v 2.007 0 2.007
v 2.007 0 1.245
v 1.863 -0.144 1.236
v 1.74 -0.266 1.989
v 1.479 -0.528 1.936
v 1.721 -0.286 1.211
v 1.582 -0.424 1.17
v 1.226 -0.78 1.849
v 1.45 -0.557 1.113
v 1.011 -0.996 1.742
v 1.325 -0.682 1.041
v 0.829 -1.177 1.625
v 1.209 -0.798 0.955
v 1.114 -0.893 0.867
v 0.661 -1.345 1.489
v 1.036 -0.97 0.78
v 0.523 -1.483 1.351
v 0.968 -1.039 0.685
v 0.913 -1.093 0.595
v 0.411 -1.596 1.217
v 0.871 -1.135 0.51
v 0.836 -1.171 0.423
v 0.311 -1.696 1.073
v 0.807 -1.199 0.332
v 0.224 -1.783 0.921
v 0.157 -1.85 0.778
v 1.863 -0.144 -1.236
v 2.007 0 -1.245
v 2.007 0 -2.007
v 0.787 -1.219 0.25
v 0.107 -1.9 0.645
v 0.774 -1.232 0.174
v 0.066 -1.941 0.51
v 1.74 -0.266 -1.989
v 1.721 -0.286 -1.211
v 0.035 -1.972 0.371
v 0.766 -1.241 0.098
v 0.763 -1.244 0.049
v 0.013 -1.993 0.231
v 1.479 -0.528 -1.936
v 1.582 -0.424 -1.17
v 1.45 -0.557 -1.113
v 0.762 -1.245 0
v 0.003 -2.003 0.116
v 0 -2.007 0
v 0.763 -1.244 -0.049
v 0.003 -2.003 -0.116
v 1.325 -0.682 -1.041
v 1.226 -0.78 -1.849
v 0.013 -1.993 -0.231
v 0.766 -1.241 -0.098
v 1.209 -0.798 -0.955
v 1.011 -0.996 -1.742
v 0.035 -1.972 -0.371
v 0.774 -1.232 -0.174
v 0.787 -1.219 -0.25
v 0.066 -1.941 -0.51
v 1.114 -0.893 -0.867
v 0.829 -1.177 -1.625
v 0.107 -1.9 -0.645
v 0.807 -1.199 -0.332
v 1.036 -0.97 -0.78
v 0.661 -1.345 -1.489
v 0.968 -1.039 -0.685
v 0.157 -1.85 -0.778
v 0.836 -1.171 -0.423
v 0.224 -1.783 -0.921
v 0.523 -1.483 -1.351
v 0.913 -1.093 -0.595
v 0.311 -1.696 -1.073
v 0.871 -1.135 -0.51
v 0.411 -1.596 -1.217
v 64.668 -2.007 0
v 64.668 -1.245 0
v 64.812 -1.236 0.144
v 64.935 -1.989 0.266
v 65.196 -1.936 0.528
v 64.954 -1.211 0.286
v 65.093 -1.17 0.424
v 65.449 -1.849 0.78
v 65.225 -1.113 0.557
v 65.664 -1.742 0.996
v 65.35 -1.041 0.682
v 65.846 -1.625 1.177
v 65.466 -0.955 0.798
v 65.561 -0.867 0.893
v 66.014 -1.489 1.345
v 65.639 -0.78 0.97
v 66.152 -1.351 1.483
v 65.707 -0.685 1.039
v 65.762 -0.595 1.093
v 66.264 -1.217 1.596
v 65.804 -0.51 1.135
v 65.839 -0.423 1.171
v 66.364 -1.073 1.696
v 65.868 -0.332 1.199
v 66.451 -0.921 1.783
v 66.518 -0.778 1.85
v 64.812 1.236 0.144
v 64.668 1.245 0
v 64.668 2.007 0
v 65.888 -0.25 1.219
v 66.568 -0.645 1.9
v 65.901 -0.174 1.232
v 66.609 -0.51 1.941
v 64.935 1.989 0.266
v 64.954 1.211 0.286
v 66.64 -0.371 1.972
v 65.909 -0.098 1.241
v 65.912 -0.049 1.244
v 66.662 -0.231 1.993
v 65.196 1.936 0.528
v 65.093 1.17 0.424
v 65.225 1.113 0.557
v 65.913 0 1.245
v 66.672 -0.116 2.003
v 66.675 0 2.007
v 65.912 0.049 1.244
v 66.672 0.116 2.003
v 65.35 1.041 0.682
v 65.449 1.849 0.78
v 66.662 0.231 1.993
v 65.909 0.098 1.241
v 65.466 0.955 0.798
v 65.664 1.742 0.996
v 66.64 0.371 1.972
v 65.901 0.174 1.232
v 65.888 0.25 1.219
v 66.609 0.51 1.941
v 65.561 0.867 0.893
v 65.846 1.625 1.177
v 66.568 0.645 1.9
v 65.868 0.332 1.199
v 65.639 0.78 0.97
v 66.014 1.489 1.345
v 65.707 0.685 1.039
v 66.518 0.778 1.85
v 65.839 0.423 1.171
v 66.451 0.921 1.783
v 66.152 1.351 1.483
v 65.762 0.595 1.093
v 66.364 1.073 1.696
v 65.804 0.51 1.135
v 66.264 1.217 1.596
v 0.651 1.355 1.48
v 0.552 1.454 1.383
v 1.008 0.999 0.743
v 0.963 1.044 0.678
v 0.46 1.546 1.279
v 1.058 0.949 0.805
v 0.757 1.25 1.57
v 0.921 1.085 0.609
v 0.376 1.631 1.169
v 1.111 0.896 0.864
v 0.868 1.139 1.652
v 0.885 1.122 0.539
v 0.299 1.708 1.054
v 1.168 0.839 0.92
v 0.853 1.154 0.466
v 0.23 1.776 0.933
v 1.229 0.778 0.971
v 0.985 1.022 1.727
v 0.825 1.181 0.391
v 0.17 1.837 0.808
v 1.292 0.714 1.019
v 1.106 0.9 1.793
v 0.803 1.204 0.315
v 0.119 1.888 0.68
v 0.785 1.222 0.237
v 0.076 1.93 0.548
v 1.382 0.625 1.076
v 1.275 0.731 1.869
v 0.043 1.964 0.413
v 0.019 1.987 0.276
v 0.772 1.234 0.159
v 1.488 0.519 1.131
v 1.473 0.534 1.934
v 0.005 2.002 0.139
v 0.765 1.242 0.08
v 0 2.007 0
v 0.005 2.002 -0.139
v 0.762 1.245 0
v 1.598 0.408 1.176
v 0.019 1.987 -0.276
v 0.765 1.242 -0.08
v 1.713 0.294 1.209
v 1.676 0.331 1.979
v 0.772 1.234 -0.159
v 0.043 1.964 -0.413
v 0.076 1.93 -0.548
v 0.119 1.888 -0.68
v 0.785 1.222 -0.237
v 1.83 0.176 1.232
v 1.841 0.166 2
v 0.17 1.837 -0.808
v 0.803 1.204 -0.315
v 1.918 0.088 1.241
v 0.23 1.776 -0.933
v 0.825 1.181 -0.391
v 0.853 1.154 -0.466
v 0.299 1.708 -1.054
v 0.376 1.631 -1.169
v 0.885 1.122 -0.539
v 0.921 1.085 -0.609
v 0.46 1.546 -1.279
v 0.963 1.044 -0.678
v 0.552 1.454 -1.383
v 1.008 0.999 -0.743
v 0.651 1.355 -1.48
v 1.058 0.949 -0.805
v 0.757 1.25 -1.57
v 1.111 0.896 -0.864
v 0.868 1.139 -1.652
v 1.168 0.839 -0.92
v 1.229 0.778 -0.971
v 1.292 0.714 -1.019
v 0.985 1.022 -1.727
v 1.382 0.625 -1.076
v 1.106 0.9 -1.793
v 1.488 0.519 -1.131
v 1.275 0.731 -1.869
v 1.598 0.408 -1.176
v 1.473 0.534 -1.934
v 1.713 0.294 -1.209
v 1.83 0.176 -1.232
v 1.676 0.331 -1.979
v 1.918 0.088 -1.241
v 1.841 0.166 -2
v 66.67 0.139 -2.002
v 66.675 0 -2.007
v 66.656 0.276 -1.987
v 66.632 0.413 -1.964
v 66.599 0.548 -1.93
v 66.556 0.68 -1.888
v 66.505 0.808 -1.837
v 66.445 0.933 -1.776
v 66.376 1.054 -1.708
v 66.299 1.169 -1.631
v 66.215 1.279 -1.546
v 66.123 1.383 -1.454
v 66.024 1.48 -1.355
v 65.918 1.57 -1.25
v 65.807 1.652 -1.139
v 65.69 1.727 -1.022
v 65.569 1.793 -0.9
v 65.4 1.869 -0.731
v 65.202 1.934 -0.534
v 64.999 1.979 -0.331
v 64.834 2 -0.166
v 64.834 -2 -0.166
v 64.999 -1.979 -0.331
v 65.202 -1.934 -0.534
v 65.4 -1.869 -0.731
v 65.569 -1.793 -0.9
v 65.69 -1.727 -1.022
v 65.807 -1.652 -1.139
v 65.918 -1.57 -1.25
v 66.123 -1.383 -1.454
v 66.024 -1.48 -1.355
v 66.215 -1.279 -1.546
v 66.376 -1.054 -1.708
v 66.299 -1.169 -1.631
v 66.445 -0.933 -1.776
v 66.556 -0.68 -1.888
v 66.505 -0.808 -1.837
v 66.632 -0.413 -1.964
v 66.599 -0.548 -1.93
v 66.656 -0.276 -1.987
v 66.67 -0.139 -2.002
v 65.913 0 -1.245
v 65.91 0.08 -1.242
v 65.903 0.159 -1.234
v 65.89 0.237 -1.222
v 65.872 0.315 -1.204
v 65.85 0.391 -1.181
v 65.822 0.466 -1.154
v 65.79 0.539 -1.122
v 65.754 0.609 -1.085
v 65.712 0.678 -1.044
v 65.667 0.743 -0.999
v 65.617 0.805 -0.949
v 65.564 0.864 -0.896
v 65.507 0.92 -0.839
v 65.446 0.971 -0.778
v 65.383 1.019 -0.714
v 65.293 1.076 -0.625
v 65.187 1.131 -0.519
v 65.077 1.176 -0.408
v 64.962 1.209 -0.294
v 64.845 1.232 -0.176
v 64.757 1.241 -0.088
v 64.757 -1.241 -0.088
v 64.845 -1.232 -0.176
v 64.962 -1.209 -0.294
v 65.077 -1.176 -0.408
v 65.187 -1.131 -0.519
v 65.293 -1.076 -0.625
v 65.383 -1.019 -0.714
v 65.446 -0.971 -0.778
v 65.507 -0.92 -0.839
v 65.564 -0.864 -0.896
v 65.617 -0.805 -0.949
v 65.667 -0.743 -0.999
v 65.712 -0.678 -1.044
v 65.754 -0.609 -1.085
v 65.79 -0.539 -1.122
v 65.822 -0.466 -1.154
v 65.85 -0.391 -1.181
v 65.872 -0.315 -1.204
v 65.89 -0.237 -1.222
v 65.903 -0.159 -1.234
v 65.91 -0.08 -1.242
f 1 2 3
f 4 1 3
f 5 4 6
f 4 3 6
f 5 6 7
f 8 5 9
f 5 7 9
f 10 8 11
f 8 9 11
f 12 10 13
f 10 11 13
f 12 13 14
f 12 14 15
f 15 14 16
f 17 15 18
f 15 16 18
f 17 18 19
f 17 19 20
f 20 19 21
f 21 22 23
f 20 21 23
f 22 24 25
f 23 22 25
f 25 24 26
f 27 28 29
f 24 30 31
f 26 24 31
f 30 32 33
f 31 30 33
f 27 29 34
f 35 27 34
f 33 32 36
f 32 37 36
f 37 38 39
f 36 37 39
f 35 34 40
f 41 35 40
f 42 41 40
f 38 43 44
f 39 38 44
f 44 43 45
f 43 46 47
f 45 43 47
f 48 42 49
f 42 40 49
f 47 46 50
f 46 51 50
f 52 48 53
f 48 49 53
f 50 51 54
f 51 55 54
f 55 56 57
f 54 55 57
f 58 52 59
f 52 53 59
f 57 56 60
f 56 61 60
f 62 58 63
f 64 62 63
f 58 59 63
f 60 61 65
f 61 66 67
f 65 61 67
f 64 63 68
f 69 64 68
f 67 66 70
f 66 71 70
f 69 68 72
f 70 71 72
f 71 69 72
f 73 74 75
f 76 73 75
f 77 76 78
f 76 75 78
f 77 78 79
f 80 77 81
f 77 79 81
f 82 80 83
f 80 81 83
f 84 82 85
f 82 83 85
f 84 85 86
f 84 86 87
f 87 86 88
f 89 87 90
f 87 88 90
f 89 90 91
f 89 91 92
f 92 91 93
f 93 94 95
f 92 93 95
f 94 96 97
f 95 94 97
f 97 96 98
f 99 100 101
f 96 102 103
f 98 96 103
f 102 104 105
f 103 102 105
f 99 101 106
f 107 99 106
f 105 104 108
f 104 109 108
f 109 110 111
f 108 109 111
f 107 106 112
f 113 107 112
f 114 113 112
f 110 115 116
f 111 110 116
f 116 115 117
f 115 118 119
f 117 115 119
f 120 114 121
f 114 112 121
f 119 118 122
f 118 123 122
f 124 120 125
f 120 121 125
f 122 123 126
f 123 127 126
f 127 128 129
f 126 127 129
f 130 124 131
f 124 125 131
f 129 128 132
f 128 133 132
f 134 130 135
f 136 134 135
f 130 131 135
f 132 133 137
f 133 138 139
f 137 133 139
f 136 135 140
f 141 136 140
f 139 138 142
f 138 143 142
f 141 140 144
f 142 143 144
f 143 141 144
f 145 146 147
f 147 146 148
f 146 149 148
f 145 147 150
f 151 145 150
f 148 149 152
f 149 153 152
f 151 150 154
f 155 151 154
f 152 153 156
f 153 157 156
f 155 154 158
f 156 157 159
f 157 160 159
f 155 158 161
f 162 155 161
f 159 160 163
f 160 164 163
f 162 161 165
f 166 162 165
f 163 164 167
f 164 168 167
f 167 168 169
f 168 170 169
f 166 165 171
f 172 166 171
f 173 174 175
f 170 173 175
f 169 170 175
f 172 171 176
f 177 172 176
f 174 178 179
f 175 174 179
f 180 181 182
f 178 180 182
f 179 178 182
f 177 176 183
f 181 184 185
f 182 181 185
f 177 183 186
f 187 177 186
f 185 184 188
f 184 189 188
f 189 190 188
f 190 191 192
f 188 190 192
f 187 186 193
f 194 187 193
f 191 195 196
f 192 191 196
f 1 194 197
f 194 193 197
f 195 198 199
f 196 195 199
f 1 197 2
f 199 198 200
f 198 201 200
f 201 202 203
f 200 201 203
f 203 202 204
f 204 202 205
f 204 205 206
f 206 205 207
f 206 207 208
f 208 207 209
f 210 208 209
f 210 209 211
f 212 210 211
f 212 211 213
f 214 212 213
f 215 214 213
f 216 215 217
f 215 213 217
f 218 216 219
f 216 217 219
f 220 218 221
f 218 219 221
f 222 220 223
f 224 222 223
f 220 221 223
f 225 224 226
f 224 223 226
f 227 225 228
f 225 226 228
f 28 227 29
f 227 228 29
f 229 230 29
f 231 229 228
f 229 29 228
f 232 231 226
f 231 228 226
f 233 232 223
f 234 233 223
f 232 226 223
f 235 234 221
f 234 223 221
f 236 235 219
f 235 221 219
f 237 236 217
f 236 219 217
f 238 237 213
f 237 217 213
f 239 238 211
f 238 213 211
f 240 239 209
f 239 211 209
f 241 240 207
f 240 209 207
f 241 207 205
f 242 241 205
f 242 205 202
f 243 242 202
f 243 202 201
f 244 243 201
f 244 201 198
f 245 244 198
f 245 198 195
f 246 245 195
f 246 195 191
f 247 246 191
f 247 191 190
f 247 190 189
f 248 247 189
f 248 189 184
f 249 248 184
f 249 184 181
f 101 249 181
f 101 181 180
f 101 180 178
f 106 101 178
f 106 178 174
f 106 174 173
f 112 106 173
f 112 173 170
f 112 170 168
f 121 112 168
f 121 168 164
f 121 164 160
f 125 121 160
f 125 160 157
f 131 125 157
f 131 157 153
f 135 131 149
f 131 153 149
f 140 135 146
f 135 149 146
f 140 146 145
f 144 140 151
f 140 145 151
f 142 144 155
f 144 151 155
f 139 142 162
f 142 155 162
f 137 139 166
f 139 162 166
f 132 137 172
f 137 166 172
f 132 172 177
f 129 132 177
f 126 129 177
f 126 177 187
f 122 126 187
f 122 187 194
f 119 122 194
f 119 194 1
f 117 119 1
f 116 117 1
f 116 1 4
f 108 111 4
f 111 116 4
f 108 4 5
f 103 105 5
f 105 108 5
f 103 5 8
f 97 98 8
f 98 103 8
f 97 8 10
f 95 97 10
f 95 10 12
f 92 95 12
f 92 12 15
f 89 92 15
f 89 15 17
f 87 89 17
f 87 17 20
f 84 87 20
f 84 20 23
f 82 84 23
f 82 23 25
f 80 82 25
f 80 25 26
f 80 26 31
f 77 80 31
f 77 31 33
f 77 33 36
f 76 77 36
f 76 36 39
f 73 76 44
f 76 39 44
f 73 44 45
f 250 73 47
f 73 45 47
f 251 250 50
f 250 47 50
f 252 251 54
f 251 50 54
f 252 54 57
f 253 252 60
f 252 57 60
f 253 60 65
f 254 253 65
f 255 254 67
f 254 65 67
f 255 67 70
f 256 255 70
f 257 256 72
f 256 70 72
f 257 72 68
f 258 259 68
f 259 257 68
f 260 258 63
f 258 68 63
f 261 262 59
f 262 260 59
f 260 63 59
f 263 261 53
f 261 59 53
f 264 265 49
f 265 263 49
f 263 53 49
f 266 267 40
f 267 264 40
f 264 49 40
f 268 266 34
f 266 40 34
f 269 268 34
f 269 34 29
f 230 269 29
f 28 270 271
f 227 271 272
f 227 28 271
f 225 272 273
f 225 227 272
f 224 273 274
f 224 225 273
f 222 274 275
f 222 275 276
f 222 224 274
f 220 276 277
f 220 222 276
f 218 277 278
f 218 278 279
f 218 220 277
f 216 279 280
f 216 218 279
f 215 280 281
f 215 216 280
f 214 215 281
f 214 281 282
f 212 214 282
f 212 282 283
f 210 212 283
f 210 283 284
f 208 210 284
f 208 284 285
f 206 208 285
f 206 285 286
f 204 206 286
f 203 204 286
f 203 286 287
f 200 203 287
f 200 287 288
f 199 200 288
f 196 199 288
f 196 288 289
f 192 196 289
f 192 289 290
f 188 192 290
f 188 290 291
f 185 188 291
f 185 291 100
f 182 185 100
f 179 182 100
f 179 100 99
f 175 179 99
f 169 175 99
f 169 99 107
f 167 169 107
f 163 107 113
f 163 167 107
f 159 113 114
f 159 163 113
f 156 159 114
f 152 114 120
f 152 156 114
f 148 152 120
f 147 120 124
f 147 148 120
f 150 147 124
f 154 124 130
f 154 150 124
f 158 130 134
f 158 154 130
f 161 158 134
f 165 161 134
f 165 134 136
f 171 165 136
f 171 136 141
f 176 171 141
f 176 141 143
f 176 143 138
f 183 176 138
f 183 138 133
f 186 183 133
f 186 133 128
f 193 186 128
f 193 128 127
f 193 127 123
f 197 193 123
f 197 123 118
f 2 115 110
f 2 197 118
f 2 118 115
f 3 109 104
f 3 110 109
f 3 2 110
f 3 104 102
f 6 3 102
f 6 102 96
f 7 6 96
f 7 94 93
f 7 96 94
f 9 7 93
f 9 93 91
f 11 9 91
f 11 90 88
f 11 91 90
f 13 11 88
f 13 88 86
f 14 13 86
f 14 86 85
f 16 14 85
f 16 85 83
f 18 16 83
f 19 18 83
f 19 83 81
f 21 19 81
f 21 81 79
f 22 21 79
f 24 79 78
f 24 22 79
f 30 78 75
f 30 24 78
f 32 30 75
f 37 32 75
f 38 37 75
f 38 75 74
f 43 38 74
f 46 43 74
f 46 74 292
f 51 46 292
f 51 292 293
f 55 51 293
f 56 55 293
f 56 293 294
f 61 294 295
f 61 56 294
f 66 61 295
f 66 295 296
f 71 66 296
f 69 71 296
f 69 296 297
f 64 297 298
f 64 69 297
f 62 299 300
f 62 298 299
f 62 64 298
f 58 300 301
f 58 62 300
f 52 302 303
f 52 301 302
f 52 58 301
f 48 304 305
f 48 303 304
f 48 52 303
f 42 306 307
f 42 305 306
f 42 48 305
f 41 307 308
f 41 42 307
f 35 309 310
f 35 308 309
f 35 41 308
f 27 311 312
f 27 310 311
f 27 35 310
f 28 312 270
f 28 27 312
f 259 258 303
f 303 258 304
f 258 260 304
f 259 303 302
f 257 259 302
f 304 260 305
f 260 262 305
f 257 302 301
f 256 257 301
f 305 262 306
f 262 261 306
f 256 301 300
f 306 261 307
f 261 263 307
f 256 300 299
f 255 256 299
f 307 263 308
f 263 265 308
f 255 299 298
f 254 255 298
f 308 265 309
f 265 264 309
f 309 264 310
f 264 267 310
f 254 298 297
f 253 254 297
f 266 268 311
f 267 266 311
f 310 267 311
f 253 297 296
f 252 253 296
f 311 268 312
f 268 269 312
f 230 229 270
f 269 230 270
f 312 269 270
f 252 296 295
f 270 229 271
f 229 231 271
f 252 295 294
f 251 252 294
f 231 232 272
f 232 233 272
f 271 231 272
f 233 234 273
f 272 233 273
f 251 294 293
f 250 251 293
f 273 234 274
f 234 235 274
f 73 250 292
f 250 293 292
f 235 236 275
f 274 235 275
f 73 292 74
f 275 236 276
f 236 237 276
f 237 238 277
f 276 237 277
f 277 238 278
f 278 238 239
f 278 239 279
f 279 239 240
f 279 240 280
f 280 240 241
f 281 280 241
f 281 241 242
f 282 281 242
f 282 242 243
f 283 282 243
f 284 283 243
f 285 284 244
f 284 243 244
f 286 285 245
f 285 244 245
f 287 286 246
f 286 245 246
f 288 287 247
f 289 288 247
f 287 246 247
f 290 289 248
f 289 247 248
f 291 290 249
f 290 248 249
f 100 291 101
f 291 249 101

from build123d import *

# Parameters (mm, degrees)
SKETCH1_R               = 2.0066
SKETCH1_R_2             = 1.2446
BOSS_EXTRUDE1_DEPTH     = 66.675
CUT_EXTRUDE2_DEPTH      = 3.0066
CUT_EXTRUDE2_DEPTH_BACK = 3.0066
CUT_EXTRUDE3_DEPTH      = 3.0066
CUT_EXTRUDE3_DEPTH_BACK = 3.0066


with BuildPart() as part:
    # Sketch1 → Boss-Extrude1 (new body)
    with BuildSketch(Plane(origin=(0, 0, 0), x_dir=(0, 0, -1), z_dir=(1, 0, 0))):
        Circle(SKETCH1_R)
        Circle(SKETCH1_R_2, mode=Mode.SUBTRACT)
    extrude(amount=BOSS_EXTRUDE1_DEPTH)

    # Sketch3 → Cut-Extrude2 (cut, two sides)
    with BuildSketch(Plane.XY) as cut_extrude2_sk:
        Polygon((0, 2.0066), (2.0066, 0), (0, -2.0066), align=None)
    extrude(amount=CUT_EXTRUDE2_DEPTH, mode=Mode.SUBTRACT)
    extrude(cut_extrude2_sk.sketch, amount=-CUT_EXTRUDE2_DEPTH_BACK, mode=Mode.SUBTRACT)

    # Sketch4 → Cut-Extrude3 (cut, two sides)
    with BuildSketch(Plane(origin=(0, 0, 0), x_dir=(1, 0, 0), z_dir=(0, 1, 0))) as cut_extrude3_sk:
        Polygon((66.675, 2.0066), (64.6684, 0), (66.675, -2.0066), align=None)
    extrude(amount=CUT_EXTRUDE3_DEPTH, mode=Mode.SUBTRACT)
    extrude(cut_extrude3_sk.sketch, amount=-CUT_EXTRUDE3_DEPTH_BACK, mode=Mode.SUBTRACT)


solid = part.part
